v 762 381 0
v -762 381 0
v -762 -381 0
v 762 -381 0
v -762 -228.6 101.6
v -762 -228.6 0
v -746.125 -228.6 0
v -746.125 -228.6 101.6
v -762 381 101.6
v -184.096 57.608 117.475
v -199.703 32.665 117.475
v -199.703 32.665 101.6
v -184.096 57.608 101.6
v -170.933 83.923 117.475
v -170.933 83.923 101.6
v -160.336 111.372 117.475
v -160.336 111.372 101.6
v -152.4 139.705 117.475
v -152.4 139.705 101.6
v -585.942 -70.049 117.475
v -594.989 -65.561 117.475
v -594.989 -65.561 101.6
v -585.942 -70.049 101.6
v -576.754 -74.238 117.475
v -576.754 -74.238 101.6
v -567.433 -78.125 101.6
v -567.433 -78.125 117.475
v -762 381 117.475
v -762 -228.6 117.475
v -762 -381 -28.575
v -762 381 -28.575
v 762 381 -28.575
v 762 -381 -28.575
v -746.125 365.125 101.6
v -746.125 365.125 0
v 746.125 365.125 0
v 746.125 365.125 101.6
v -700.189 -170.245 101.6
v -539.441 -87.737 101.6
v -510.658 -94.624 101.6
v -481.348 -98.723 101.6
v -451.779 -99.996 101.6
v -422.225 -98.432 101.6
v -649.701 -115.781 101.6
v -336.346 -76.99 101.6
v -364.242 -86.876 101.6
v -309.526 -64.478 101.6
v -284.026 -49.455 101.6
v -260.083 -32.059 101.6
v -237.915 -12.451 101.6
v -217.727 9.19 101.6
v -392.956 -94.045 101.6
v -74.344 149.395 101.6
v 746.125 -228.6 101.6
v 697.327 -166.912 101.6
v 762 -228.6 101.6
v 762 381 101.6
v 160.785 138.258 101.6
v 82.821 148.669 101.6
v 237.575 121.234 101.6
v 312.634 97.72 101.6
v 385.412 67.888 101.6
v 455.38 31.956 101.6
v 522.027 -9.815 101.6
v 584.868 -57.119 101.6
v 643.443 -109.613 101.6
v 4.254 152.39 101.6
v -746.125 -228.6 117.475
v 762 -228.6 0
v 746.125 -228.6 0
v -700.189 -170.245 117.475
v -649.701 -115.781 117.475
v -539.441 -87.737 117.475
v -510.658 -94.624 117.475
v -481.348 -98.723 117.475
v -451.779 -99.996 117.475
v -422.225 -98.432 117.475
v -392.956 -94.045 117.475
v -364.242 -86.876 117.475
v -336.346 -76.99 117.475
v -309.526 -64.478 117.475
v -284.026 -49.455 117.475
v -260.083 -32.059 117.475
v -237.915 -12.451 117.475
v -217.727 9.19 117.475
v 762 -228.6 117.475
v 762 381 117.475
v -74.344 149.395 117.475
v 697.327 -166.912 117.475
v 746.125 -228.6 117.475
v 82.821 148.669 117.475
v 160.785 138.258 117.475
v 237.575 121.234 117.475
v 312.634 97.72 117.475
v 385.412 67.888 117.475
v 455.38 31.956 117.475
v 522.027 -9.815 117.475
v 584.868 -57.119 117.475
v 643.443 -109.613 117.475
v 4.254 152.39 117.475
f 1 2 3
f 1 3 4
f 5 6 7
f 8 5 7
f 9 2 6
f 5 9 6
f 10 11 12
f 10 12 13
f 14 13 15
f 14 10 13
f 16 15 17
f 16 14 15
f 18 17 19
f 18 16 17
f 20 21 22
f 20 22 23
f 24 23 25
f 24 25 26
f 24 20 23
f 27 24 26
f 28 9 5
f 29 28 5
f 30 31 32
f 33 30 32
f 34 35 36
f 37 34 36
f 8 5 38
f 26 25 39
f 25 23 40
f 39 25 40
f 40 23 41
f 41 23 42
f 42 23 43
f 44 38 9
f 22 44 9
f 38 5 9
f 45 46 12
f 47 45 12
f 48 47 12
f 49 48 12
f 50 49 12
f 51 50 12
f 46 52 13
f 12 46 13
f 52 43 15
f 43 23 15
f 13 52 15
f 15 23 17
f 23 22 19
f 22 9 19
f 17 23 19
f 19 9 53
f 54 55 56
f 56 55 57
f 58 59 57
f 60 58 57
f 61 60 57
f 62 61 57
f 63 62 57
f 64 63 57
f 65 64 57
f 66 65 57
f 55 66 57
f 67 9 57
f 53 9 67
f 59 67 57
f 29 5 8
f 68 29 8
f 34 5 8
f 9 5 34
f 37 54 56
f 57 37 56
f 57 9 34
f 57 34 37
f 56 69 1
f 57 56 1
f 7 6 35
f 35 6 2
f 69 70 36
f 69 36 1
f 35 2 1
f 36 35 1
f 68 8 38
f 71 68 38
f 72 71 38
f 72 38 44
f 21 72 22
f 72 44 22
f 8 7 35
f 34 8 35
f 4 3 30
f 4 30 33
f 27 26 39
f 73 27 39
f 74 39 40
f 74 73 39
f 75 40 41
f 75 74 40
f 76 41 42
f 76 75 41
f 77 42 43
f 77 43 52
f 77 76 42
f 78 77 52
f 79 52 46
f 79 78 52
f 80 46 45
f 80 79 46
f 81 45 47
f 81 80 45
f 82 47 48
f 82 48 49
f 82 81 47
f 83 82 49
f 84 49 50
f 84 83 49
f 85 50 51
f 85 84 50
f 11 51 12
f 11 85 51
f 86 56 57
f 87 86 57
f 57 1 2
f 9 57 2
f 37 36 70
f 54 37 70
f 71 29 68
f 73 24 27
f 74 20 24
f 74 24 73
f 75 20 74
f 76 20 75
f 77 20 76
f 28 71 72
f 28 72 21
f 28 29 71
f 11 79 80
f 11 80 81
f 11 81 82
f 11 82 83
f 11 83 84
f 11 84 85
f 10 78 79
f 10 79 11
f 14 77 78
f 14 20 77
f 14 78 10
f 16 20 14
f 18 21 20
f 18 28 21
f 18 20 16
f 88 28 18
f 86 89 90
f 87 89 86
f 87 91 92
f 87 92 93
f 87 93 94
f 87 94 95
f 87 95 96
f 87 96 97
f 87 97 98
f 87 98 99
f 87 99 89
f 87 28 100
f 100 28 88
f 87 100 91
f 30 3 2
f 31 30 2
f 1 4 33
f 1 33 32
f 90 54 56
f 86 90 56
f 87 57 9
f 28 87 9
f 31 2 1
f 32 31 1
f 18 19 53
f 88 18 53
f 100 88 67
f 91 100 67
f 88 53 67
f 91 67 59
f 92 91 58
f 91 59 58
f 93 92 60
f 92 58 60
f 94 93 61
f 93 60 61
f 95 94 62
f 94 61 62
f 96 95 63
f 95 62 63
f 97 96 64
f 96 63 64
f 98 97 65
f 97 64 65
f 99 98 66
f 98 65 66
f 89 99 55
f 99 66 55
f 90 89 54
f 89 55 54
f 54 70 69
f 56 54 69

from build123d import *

# Parameters (mm, degrees)
F0_W     = 1524
F0_H     = 762
F1_DEPTH = 28.575
F2_W     = 1492.25
F2_H     = 15.875
F3_DEPTH = 101.6
F5_DEPTH = 15.875
F7_DEPTH = 15.875


with BuildPart() as f1:
    # F0 (on Top) → F1 (new body)
    with BuildSketch(Plane.XY):
        Rectangle(F0_W, F0_H)
    extrude(amount=-F1_DEPTH)


with BuildPart() as f3:
    # F2 (on face) → F3 (new body)
    with BuildSketch(Plane.XY):
        Polygon((-746.125, 381), (-762, 381), (-762, -228.6), (-746.125, -228.6), (-746.125, 365.125), align=None)
        with Locations((0, 373.0625)):
            Rectangle(F2_W, F2_H)
        Polygon((762, 381), (746.125, 381), (746.125, 365.125), (746.125, -228.6), (762, -228.6), align=None)
    extrude(amount=F3_DEPTH)


with BuildPart() as f5:
    # F4 (on face) → F5 (new body)
    with BuildSketch(Plane.XY.offset(101.6)):
        with BuildLine():
            ThreePointArc((-746.125, -228.6), (0, 152.4), (746.125, -228.6))
            Line((746.125, -228.6), (746.125, 365.125))
            Line((746.125, 365.125), (-746.125, 365.125))
            Line((-746.125, 365.125), (-746.125, -228.6))
        make_face()
        Polygon((746.125, 365.125), (746.125, -228.6), (762, -228.6), (762, 381), (-762, 381), (-762, -228.6), (-746.125, -228.6), (-746.125, 365.125), align=None)
    extrude(amount=F5_DEPTH)

    # F6 (on face) → F7 (join, through all)
    with BuildSketch(Plane.XY.offset(117.475)):
        with BuildLine():
            Line((-567.4328792848, -78.1248988452), (-578.9371297689, -52.2859292015))
            ThreePointArc((-578.9371297689, -52.2859292015), (-587.0006306772, -58.8779613313), (-594.9890778051, -65.5607486976))
            ThreePointArc((-594.9890778051, -65.5607486976), (-581.3651457464, -72.180949467), (-567.4328792848, -78.1248988452))
        make_face()
        with BuildLine():
            Line((-199.7034395213, 32.6653174527), (-238.9702921956, 120.8601125546))
            ThreePointArc((-238.9702921956, 120.8601125546), (-418.0167767807, 52.0821379101), (-578.9371297689, -52.2859292015))
            Line((-578.9371297689, -52.2859292015), (-567.4328792848, -78.1248988452))
            ThreePointArc((-567.4328792848, -78.1248988452), (-475.493372553, -99.2006820611), (-381.4815066983, -91.5305702783))
            Line((-381.4815066983, -91.5305702783), (-278.2292465465, -45.5597022358))
            ThreePointArc((-278.2292465465, -45.5597022358), (-235.4267896146, -10.0003559429), (-199.7034395213, 32.6653174527))
        make_face()
        with BuildLine():
            ThreePointArc((-152.4, 139.7046238869), (-195.9118559586, 131.3238565645), (-238.9702921956, 120.8601125546))
            Line((-238.9702921956, 120.8601125546), (-199.7034395213, 32.6653174527))
            ThreePointArc((-199.7034395213, 32.6653174527), (-170.9332051828, 83.9229666188), (-152.4, 139.7046238869))
        make_face()
        with BuildLine():
            ThreePointArc((-381.4815066983, -91.5305702783), (-327.733588399, -73.3107506333), (-278.2292465465, -45.5597022358))
            Line((-278.2292465465, -45.5597022358), (-381.4815066983, -91.5305702783))
        make_face()
    extrude(amount=-F7_DEPTH)


solid = Compound([f1.part, f3.part, f5.part])
